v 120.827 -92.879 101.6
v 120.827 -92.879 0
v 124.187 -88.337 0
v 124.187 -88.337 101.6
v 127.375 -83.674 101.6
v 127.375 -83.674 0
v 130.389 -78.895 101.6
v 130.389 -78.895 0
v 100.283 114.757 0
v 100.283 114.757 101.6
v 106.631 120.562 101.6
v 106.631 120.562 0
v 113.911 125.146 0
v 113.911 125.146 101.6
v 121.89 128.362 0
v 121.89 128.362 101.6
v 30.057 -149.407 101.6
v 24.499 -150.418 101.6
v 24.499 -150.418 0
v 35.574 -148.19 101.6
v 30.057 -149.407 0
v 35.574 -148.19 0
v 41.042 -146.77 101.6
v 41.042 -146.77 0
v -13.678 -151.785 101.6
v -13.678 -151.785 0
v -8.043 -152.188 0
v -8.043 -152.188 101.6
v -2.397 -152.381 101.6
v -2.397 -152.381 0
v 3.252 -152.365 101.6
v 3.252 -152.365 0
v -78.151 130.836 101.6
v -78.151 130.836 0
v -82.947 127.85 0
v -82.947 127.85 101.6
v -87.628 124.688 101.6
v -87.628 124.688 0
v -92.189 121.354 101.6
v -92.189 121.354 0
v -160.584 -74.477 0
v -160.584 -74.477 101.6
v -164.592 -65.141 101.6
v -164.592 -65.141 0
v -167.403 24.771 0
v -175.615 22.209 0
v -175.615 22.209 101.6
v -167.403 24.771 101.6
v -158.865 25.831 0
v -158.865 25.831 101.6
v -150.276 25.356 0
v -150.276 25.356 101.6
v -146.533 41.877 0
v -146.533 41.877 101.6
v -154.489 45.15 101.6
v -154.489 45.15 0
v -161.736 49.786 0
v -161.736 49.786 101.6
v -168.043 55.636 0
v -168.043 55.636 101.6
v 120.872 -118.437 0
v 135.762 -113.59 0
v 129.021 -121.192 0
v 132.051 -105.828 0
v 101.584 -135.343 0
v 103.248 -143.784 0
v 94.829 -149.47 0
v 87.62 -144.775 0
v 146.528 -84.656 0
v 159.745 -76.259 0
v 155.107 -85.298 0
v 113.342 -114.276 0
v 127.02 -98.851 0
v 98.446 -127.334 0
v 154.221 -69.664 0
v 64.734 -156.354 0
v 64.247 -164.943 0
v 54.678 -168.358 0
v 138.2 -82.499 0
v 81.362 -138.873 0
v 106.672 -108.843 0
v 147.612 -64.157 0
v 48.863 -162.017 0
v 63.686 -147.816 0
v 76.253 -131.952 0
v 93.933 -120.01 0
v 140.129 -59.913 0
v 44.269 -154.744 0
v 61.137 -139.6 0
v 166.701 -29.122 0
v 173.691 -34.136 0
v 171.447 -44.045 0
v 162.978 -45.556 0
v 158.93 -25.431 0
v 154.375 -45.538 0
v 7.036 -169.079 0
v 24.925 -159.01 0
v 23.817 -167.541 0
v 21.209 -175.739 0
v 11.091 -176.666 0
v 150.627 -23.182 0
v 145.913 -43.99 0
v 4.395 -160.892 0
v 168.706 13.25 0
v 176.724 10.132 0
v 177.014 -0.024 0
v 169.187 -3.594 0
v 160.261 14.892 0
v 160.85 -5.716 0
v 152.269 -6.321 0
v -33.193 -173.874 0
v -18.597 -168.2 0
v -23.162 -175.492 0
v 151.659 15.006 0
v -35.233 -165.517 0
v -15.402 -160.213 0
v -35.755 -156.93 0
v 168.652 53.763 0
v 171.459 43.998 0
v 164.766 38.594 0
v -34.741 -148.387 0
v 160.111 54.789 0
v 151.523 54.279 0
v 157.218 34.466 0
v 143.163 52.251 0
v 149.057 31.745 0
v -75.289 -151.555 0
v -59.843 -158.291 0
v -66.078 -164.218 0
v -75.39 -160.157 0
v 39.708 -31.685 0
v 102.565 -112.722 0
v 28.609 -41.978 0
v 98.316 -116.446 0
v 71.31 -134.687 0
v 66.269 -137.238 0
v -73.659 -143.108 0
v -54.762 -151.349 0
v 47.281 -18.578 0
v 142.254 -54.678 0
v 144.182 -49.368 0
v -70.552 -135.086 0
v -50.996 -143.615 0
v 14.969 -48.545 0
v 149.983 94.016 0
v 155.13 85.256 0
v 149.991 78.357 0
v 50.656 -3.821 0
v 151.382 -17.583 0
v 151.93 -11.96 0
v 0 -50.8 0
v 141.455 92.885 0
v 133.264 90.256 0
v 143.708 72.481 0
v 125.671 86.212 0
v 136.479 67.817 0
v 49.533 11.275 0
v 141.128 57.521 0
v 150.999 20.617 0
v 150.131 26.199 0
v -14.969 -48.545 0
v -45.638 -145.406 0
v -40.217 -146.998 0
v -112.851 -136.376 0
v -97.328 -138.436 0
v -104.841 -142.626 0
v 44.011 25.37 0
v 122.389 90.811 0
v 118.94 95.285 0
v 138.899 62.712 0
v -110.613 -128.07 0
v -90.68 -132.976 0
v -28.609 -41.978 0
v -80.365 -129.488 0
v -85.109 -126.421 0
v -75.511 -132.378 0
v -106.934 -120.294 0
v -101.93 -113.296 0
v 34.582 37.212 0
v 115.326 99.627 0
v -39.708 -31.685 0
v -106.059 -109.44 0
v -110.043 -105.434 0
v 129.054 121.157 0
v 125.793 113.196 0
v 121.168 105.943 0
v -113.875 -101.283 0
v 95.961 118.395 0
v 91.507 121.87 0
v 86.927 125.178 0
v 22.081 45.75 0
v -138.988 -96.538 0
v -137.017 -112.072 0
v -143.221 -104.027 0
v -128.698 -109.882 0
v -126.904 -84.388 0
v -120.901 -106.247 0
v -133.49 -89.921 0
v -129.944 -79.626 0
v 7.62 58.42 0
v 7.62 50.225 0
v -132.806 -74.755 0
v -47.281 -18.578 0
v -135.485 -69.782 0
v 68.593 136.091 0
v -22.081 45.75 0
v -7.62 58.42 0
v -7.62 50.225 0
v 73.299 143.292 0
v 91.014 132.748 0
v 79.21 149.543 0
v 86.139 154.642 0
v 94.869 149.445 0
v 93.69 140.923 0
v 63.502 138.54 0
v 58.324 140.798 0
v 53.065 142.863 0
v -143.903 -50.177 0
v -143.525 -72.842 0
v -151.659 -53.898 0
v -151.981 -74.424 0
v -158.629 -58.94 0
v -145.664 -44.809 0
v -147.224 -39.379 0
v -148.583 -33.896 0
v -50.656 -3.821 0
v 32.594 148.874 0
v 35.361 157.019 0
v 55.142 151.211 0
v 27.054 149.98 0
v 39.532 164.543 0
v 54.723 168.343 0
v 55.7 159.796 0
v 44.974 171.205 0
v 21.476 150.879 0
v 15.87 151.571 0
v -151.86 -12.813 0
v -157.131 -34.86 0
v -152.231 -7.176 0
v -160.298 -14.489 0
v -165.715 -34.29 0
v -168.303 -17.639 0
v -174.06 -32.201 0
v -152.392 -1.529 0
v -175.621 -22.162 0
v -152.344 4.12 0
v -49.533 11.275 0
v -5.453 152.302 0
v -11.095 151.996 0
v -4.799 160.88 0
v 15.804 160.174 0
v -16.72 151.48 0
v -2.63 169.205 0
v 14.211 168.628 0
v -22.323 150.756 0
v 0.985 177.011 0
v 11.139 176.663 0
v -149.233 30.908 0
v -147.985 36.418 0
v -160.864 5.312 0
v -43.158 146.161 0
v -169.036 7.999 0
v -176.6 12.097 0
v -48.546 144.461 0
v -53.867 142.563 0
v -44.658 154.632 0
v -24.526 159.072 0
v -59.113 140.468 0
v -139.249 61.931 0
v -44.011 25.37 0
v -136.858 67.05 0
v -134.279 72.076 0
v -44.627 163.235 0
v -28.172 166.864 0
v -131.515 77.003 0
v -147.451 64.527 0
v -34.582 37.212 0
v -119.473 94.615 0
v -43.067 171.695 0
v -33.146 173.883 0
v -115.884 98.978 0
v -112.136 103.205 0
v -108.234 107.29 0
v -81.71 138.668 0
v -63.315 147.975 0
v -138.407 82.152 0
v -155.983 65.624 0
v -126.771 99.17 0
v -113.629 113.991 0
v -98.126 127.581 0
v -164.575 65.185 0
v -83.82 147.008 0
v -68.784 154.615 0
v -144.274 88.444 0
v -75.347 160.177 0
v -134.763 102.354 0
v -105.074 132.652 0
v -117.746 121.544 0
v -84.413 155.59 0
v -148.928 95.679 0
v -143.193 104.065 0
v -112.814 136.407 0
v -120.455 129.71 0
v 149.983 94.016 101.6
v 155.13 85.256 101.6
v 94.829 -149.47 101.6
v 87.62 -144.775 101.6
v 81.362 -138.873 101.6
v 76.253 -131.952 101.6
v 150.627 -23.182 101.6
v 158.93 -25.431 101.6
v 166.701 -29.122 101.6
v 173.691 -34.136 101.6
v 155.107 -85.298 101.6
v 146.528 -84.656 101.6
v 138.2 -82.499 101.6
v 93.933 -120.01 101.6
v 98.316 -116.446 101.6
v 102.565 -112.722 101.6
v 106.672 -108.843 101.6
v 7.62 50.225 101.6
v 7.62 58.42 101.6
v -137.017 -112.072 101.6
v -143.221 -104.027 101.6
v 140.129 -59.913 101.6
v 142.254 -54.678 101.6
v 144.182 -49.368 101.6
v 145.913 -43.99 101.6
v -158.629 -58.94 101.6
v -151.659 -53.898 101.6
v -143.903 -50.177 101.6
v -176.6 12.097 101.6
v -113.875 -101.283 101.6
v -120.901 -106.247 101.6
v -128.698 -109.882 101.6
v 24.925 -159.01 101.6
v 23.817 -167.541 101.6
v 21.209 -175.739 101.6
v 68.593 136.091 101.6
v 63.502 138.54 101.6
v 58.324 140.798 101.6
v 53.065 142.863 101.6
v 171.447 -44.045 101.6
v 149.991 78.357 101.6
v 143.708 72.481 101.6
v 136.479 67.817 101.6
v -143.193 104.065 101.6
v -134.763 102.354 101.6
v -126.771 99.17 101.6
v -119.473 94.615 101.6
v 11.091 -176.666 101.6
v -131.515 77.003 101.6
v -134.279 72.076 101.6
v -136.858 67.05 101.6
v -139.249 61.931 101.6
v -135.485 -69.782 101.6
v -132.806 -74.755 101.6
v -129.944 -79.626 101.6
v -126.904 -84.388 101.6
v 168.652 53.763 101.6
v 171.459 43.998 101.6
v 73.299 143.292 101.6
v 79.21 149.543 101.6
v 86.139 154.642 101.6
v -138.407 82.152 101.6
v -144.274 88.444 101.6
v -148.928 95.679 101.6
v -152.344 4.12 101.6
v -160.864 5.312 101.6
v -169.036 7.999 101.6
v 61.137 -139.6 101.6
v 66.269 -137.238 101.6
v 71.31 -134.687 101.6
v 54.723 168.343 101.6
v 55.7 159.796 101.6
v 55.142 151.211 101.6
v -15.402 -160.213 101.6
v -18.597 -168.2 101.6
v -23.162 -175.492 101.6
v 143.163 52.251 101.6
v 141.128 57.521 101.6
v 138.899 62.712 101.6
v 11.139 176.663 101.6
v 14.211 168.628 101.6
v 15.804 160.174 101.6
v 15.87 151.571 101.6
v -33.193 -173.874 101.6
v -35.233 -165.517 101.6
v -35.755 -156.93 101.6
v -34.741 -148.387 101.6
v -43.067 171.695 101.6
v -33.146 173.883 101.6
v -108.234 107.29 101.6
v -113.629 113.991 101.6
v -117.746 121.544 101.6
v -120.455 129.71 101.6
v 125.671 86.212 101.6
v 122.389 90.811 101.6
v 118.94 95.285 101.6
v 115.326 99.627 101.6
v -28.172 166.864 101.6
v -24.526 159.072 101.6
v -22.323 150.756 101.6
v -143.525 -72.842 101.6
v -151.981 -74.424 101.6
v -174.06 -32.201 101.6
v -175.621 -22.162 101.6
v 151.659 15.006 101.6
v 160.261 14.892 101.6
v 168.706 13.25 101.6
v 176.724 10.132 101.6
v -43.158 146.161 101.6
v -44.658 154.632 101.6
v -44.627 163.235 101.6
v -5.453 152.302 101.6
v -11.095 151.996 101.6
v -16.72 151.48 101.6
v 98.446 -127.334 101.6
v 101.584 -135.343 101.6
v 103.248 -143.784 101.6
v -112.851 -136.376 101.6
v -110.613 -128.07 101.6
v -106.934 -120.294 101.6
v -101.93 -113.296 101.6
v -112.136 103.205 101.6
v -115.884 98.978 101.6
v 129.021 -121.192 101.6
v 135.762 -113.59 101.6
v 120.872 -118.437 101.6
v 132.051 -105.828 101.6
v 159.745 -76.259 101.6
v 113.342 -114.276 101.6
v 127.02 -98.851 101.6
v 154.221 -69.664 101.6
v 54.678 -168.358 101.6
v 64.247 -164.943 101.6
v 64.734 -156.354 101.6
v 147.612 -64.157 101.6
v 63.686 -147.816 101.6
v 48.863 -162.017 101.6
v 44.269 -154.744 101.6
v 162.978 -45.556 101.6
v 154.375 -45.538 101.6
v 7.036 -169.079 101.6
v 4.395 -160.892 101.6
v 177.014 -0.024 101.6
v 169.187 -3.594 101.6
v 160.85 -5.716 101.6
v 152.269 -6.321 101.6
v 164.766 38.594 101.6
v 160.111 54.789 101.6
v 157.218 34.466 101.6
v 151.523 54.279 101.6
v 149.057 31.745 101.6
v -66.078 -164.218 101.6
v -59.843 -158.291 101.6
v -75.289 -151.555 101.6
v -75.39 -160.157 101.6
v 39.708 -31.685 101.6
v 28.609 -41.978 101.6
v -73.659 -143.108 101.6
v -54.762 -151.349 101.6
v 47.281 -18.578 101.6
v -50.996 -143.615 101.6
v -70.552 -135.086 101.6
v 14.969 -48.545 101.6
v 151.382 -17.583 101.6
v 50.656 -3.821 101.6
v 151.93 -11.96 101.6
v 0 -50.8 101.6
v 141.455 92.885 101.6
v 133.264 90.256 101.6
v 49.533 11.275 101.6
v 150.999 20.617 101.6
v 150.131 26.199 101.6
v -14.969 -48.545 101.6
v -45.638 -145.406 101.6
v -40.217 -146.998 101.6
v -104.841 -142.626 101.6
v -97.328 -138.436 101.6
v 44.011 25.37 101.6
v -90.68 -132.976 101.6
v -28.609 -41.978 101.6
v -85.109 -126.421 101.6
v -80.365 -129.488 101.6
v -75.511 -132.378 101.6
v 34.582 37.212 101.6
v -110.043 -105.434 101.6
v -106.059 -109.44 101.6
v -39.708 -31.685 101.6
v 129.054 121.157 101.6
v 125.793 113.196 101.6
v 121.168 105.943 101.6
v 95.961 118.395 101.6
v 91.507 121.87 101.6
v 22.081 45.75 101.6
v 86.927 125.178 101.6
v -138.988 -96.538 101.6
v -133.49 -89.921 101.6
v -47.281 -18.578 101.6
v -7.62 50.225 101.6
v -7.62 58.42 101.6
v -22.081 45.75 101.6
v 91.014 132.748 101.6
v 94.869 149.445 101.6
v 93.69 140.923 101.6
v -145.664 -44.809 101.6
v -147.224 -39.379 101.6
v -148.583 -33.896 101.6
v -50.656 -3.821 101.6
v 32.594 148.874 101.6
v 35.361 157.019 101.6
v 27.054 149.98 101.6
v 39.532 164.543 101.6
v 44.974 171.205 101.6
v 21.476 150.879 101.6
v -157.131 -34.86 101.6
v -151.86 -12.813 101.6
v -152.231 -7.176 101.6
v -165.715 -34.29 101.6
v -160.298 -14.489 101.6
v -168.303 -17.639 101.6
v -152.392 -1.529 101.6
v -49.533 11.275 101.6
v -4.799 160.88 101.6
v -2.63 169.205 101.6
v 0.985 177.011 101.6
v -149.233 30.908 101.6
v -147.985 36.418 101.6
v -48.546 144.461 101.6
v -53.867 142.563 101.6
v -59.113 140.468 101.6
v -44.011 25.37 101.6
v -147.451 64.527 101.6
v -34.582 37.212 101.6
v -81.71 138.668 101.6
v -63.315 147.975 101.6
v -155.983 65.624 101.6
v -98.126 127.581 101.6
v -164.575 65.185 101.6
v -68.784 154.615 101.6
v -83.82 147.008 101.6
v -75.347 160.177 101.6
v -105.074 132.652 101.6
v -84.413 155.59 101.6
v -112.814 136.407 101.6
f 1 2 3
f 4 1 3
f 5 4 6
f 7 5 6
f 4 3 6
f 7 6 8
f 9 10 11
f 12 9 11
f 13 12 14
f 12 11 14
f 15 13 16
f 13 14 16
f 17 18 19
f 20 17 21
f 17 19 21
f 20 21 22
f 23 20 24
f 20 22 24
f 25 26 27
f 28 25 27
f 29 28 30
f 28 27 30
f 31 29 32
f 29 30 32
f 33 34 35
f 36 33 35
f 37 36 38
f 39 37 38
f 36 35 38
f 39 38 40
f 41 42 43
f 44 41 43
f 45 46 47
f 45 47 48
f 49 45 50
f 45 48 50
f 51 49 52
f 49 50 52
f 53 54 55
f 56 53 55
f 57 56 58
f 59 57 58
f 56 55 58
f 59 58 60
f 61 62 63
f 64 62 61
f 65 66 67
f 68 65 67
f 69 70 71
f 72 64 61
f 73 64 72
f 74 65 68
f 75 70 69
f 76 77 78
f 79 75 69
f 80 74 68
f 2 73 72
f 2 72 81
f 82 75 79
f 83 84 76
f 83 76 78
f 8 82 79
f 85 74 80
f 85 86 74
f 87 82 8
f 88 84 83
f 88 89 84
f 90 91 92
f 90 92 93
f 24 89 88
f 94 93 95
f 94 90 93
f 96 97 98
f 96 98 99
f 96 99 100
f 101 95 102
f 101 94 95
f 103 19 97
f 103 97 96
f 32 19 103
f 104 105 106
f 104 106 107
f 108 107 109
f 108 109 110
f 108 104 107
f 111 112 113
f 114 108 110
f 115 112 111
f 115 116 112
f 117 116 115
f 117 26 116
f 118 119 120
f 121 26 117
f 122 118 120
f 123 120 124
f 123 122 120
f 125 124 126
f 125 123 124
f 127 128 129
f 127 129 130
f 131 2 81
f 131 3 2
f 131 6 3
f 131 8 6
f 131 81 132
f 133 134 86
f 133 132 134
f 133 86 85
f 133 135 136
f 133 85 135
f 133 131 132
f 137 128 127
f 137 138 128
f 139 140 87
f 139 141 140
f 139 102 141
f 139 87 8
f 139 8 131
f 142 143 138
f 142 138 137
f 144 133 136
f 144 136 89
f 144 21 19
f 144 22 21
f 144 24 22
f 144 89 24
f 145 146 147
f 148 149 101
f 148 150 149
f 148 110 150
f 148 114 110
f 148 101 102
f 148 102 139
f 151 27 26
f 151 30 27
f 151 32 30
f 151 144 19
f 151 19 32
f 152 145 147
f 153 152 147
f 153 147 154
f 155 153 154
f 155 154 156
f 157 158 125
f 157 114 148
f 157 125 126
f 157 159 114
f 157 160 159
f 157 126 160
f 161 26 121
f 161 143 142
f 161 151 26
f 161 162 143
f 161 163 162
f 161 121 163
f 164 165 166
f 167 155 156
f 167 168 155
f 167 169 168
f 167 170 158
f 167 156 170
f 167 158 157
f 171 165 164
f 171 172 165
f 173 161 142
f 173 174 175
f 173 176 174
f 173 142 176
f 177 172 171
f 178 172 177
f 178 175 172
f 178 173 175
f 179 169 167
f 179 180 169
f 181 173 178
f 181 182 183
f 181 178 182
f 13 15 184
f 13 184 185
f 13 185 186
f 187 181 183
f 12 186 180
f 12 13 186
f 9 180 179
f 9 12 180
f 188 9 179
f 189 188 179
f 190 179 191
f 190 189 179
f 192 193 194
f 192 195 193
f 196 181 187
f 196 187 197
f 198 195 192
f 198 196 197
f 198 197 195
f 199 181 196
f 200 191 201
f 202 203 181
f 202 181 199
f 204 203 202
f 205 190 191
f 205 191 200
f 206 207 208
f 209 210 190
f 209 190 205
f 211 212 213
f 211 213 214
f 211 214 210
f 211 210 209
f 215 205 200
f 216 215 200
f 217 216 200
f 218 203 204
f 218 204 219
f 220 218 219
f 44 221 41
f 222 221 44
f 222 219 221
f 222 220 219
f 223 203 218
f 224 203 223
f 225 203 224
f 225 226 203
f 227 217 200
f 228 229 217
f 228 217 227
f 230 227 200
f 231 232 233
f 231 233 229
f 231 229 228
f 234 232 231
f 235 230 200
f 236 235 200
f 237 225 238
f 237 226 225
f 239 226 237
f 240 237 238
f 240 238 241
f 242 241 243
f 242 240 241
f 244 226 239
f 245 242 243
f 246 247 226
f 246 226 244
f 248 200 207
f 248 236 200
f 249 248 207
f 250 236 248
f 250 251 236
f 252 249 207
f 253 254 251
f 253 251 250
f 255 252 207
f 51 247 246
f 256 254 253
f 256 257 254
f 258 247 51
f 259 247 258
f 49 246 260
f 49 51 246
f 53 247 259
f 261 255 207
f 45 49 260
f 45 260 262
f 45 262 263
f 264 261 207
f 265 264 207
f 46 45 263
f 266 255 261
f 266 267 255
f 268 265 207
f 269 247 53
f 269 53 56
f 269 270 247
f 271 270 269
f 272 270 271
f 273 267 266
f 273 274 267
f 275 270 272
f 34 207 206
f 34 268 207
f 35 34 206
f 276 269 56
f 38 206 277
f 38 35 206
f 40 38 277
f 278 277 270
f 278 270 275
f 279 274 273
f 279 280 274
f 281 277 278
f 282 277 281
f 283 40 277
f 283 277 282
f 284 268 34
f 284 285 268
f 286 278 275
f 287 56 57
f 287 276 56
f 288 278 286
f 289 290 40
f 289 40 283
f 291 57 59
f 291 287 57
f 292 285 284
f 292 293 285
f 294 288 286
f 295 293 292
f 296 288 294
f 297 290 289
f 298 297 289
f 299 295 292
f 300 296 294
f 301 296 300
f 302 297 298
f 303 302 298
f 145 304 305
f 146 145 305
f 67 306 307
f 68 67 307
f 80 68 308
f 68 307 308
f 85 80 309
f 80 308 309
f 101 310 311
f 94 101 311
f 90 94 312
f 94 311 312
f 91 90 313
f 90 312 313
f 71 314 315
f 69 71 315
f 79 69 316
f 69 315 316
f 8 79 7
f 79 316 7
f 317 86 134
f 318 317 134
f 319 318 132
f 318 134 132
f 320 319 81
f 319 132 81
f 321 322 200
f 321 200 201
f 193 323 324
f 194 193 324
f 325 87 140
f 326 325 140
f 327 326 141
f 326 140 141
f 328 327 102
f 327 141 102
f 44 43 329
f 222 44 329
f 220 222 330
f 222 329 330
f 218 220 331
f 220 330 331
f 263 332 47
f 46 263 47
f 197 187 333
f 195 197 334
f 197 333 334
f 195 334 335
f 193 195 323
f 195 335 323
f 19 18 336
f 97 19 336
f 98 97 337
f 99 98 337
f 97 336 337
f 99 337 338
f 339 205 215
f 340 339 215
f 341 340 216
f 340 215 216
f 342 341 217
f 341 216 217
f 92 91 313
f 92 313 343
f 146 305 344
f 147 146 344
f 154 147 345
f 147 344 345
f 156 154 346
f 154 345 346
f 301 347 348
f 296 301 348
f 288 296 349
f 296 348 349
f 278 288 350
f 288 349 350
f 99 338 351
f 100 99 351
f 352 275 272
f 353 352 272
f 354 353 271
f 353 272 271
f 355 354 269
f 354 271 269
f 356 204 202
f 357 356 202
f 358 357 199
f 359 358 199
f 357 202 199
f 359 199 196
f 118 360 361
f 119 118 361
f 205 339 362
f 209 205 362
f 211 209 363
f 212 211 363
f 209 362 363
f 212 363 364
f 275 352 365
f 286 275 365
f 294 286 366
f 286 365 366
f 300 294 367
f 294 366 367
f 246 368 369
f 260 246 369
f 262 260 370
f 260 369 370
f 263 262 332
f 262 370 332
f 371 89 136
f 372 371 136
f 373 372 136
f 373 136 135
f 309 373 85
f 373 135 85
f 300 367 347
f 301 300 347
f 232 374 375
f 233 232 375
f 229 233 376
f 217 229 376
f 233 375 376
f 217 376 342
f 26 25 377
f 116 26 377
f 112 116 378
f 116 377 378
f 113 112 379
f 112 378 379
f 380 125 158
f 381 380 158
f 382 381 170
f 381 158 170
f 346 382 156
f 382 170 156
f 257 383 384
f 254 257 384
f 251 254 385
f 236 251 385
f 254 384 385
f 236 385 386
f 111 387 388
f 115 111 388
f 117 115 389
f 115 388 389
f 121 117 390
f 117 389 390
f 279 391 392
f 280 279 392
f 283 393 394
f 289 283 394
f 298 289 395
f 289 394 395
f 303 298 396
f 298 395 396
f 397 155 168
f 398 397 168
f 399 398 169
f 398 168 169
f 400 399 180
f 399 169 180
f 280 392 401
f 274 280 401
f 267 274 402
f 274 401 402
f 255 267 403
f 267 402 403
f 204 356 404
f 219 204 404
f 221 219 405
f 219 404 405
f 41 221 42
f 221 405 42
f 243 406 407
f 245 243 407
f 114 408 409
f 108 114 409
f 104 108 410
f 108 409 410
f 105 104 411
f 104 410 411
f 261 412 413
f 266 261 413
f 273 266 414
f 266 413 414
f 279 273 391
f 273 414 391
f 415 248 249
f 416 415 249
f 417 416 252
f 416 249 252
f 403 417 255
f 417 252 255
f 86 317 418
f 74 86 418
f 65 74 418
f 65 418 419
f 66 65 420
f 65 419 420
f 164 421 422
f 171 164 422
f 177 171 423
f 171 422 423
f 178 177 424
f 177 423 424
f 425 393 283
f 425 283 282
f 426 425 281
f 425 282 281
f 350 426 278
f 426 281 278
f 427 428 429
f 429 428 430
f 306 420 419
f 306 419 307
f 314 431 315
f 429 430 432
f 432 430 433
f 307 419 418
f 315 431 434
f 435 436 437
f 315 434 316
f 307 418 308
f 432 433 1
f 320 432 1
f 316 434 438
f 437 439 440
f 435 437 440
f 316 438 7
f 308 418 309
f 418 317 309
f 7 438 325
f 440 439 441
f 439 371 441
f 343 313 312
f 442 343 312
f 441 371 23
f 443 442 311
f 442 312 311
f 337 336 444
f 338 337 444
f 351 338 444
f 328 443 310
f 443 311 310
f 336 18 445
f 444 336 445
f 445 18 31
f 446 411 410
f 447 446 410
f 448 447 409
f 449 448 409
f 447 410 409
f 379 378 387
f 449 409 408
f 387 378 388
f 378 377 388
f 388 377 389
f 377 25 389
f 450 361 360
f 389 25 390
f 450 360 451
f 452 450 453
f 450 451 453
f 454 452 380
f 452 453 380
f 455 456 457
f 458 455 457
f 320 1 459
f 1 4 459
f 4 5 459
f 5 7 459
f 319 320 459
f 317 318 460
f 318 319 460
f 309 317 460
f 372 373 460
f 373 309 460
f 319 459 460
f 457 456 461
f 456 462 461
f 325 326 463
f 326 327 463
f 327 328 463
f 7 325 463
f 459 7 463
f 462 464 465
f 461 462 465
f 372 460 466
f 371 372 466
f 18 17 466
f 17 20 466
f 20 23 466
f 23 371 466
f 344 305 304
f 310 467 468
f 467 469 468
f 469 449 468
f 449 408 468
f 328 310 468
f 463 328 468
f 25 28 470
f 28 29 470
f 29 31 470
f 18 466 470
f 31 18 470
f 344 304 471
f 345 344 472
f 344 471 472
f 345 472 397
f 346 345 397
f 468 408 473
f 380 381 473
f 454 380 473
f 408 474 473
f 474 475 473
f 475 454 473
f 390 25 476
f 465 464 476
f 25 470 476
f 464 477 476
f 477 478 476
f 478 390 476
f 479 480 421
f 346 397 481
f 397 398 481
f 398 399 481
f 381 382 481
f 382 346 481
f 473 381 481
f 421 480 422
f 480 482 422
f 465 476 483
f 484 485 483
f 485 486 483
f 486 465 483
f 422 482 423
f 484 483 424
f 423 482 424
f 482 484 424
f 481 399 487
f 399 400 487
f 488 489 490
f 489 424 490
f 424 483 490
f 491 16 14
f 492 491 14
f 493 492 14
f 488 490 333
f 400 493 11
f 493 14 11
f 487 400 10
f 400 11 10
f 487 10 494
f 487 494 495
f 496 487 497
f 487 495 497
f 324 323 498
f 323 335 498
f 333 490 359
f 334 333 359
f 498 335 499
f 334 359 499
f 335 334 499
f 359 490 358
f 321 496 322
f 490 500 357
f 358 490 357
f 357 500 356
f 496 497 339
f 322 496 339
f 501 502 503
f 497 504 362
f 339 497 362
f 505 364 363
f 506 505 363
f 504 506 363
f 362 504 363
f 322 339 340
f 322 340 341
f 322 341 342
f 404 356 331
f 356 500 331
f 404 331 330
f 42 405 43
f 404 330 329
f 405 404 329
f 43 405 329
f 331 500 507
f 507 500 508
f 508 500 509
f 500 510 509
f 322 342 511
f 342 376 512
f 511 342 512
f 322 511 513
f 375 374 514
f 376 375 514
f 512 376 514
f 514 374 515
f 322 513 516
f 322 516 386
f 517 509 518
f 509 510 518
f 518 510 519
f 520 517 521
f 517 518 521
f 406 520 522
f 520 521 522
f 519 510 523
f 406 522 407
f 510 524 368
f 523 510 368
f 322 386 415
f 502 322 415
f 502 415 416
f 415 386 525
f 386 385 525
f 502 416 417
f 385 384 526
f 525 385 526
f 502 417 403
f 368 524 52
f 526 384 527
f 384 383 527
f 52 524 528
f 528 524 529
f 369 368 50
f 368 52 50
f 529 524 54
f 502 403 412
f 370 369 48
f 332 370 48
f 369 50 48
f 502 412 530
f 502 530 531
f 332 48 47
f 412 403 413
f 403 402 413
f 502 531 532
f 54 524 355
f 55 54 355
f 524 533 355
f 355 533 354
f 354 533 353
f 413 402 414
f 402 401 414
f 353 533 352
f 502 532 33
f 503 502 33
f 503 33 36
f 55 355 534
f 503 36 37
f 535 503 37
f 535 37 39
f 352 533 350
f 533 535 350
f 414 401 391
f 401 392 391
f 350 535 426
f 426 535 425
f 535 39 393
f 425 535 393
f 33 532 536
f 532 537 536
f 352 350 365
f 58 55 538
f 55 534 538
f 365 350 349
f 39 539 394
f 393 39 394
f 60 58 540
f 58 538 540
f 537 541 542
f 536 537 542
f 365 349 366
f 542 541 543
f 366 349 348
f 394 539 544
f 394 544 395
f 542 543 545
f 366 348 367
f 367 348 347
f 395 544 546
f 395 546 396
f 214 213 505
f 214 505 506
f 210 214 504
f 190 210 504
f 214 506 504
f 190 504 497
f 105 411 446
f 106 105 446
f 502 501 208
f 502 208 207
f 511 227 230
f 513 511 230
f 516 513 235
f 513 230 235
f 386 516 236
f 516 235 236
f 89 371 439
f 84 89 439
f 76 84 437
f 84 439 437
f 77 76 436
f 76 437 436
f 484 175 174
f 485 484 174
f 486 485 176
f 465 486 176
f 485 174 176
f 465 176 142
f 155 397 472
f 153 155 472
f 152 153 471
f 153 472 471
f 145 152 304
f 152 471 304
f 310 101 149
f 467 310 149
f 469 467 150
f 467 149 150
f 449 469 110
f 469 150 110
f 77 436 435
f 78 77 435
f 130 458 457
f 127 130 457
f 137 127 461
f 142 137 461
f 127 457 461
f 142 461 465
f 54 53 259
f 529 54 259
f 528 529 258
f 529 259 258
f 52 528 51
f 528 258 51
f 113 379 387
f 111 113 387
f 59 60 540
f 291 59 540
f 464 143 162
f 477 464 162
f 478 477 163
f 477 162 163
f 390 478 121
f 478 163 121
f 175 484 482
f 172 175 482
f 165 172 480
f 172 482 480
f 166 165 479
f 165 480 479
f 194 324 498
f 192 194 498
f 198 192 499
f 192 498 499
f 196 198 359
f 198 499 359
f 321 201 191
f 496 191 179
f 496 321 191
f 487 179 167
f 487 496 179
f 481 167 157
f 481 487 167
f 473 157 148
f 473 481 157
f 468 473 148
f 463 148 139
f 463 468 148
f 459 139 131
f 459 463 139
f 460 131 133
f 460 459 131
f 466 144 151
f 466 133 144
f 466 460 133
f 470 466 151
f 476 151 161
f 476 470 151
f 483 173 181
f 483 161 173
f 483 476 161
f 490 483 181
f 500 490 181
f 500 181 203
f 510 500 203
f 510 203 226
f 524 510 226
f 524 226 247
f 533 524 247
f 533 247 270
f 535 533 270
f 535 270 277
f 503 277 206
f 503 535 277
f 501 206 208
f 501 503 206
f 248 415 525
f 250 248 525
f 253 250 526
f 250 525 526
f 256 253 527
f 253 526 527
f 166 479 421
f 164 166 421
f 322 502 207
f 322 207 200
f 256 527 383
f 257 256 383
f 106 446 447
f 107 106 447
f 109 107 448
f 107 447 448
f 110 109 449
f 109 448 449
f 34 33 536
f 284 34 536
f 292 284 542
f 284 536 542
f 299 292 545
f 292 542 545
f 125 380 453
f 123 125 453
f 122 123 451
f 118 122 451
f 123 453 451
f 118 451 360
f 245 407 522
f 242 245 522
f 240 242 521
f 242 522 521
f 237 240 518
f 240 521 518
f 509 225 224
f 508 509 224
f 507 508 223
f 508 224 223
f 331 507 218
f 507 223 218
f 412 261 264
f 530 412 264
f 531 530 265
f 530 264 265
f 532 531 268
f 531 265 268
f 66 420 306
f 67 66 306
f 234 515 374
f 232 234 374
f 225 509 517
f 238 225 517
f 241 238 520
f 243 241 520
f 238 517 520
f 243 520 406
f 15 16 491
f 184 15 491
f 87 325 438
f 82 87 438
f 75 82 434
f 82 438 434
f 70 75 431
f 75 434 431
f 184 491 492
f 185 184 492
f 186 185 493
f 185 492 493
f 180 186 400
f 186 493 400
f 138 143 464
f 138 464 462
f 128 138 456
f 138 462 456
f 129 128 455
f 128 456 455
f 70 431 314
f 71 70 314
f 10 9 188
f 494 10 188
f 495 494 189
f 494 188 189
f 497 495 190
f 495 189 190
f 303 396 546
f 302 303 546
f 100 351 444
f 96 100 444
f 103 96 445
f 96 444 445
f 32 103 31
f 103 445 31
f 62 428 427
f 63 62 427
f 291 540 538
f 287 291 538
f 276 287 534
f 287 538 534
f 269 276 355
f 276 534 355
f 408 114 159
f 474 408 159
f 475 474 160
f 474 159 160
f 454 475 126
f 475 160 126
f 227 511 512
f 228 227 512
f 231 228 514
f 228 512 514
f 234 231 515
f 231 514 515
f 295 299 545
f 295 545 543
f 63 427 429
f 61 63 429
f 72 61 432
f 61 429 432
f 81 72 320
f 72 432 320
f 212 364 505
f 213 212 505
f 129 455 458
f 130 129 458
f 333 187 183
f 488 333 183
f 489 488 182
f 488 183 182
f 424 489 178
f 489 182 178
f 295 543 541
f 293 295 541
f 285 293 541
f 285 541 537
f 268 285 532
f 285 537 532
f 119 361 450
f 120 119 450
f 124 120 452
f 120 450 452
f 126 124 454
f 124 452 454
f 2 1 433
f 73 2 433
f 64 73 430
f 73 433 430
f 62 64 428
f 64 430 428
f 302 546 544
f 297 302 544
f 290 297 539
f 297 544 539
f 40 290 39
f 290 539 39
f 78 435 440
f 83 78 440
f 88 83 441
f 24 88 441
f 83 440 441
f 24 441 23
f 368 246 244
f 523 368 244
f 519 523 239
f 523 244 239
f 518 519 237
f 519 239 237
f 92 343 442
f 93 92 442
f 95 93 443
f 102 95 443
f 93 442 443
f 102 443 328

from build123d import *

# Parameters (mm, degrees)
SKETCH1_R           = 152.4
BOSS_EXTRUDE1_DEPTH = 101.6
CUT_EXTRUDE1_DEPTH  = 102.6
BOSS_EXTRUDE3_DEPTH = 101.6


with BuildPart() as part:
    # Sketch1 → Boss-Extrude1 (new body)
    with BuildSketch(Plane.XY):
        Circle(SKETCH1_R)
    extrude(amount=BOSS_EXTRUDE1_DEPTH)

    # Sketch2 → Cut-Extrude1 (cut, through all)
    with BuildSketch(Plane.XY.offset(101.6)):
        with BuildLine():
            Line((-7.62, 50.225248631), (-7.62, 58.42))
            Line((-7.62, 58.42), (7.62, 58.42))
            Line((7.62, 58.42), (7.62, 50.225248631))
            ThreePointArc((7.62, 50.225248631), (0, -50.8), (-7.62, 50.225248631))
        make_face()
    extrude(amount=-CUT_EXTRUDE1_DEPTH, mode=Mode.SUBTRACT)

    # Sketch3 → Boss-Extrude3 (add)
    with BuildSketch(Plane.XY.offset(101.6)):
        with BuildLine():
            Line((0.984560076, 177.011085759), (11.138596509, 176.66302813))
            ThreePointArc((11.138596509, 176.66302813), (15.196562883, 164.436371227), (15.869603853, 151.571487007))
            ThreePointArc((15.869603853, 151.571487007), (5.22086444, 152.310546498), (-5.453487698, 152.302394833))
            ThreePointArc((-5.453487698, 152.302394833), (-3.901102684, 165.090996434), (0.984560076, 177.011085759))
        make_face()
        with BuildLine():
            Line((44.974495255, 171.205106866), (54.722965549, 168.342777932))
            ThreePointArc((54.722965549, 168.342777932), (55.612797522, 155.491068739), (53.065327067, 142.862980031))
            ThreePointArc((53.065327067, 142.862980031), (42.934934006, 146.227054412), (32.593909032, 148.873762275))
            ThreePointArc((32.593909032, 148.873762275), (37.277918906, 160.874523986), (44.974495255, 171.205106866))
        make_face()
        with BuildLine():
            Line((86.138517492, 154.641681459), (94.868889406, 149.444931875))
            ThreePointArc((94.868889406, 149.444931875), (92.534675563, 136.775690545), (86.926760621, 125.177866606))
            ThreePointArc((86.926760621, 125.177866606), (77.951243764, 130.955578711), (68.593310586, 136.090843714))
            ThreePointArc((68.593310586, 136.090843714), (76.114631752, 146.549713541), (86.138517492, 154.641681459))
        make_face()
        with BuildLine():
            Line((121.890139881, 128.361550474), (129.053852039, 121.156911128))
            ThreePointArc((129.053852039, 121.156911128), (123.642259619, 109.46619269), (115.326266111, 99.62736745))
            ThreePointArc((115.326266111, 99.62736745), (108.069590193, 107.455682379), (100.282742167, 114.756836935))
            ThreePointArc((100.282742167, 114.756836935), (110.168782355, 123.016645622), (121.890139881, 128.361550474))
        make_face()
        with BuildLine():
            Line((149.9829565, 94.015991192), (155.129886522, 85.256156071))
            ThreePointArc((155.129886522, 85.256156071), (146.980945779, 75.278531359), (136.47939816, 67.816914393))
            ThreePointArc((136.47939816, 67.816914393), (131.397526817, 77.203950329), (125.671040244, 86.212236046))
            ThreePointArc((125.671040244, 86.212236046), (137.30062319, 91.753989435), (149.9829565, 94.015991192))
        make_face()
        with BuildLine():
            Line((168.651792363, 53.763061417), (171.458539706, 43.998443178))
            ThreePointArc((171.458539706, 43.998443178), (161.084278558, 36.360843047), (149.057027687, 31.745275192))
            ThreePointArc((149.057027687, 31.745275192), (146.469273585, 42.101210144), (143.162964676, 52.250603299))
            ThreePointArc((143.162964676, 52.250603299), (155.805360914, 54.726092645), (168.651792363, 53.763061417))
        make_face()
        with BuildLine():
            Line((176.723615855, 10.132000766), (177.01382226, -0.023853715))
            ThreePointArc((177.01382226, -0.023853715), (165.066093688, -4.841530759), (152.268855971, -6.3210364))
            ThreePointArc((152.268855971, -6.3210364), (152.337817217, 4.353096088), (151.659433521, 15.005872983))
            ThreePointArc((151.659433521, 15.005872983), (164.520274799, 14.259554184), (176.723615855, 10.132000766))
        make_face()
        with BuildLine():
            Line((173.691244618, -34.135690756), (171.446675351, -44.044651791))
            ThreePointArc((171.446675351, -44.044651791), (158.676199082, -45.739693381), (145.913072029, -43.990174028))
            ThreePointArc((145.913072029, -43.990174028), (148.634415534, -33.668539005), (150.626582394, -23.181731521))
            ThreePointArc((150.626582394, -23.181731521), (162.897774756, -27.102964508), (173.691244618, -34.135690756))
        make_face()
        with BuildLine():
            Line((159.74521369, -76.258511285), (155.106903292, -85.297962411))
            ThreePointArc((155.106903292, -85.297962411), (142.316095317, -83.76386285), (130.389033141, -78.895247238))
            ThreePointArc((130.389033141, -78.895247238), (135.591766884, -69.574655969), (140.129309129, -59.912742576))
            ThreePointArc((140.129309129, -59.912742576), (151.039808429, -66.762504263), (159.74521369, -76.258511285))
        make_face()
        with BuildLine():
            Line((135.761803484, -113.589729091), (129.021194056, -121.191688348))
            ThreePointArc((129.021194056, -121.191688348), (117.013747881, -116.524840753), (106.672171762, -108.843041907))
            ThreePointArc((106.672171762, -108.843041907), (114.02938885, -101.109141419), (120.827196012, -92.879215672))
            ThreePointArc((120.827196012, -92.879215672), (129.691455452, -102.227110339), (135.761803484, -113.589729091))
        make_face()
        with BuildLine():
            Line((103.247979869, -143.783686465), (94.828608691, -149.470494794))
            ThreePointArc((94.828608691, -149.470494794), (84.358996319, -141.964134364), (76.25270552, -131.951827956))
            ThreePointArc((76.25270552, -131.951827956), (85.302124943, -126.290567662), (93.933065798, -120.009746062))
            ThreePointArc((93.933065798, -120.009746062), (100.194111358, -131.268411108), (103.247979869, -143.783686465))
        make_face()
        with BuildLine():
            Line((64.246705958, -164.943186018), (54.677593087, -168.357520338))
            ThreePointArc((54.677593087, -168.357520338), (46.403658768, -158.483299305), (41.042001351, -146.76959537))
            ThreePointArc((41.042001351, -146.76959537), (51.215014806, -143.536693073), (61.136775598, -139.599622741))
            ThreePointArc((61.136775598, -139.599622741), (64.401202759, -152.061634836), (64.246705958, -164.943186018))
        make_face()
        with BuildLine():
            Line((21.20857523, -175.738698575), (11.090983218, -176.666023704))
            ThreePointArc((11.090983218, -176.666023704), (5.532608676, -165.04437569), (3.252477296, -152.365289326))
            ThreePointArc((3.252477296, -152.365289326), (13.909876934, -151.763880168), (24.499036942, -150.417941712))
            ThreePointArc((24.499036942, -150.417941712), (24.561729739, -163.300266803), (21.20857523, -175.738698575))
        make_face()
        with BuildLine():
            Line((-23.16216828, -175.49190238), (-33.192513915, -173.873951069))
            ThreePointArc((-33.192513915, -173.873951069), (-35.686075567, -161.23510696), (-34.74141187, -148.387311794))
            ThreePointArc((-34.74141187, -148.387311794), (-24.269269663, -150.455184524), (-13.678066306, -151.784948207))
            ThreePointArc((-13.678066306, -151.784948207), (-16.821047091, -164.27814243), (-23.16216828, -175.49190238))
        make_face()
        with BuildLine():
            Line((-66.077547573, -164.218304543), (-75.390403326, -160.156738624))
            ThreePointArc((-75.390403326, -160.156738624), (-74.662472438, -147.294843478), (-70.552370357, -135.085613731))
            ThreePointArc((-70.552370357, -135.085613731), (-60.923488791, -139.6928363), (-50.995726343, -143.61474818))
            ThreePointArc((-50.995726343, -143.61474818), (-57.14689567, -154.933818196), (-66.077547573, -164.218304543))
        make_face()
        with BuildLine():
            Line((-104.841031535, -142.62626668), (-112.851236429, -136.376289276))
            ThreePointArc((-112.851236429, -136.376289276), (-108.947551576, -124.099503267), (-101.930263942, -113.295989747))
            ThreePointArc((-101.930263942, -113.295989747), (-93.749661058, -120.153073417), (-85.109137346, -126.420705346))
            ThreePointArc((-85.109137346, -126.420705346), (-93.881994622, -135.854432358), (-104.841031535, -142.62626668))
        make_face()
        with BuildLine():
            Line((-137.016967907, -112.072495938), (-143.22121131, -104.026816116))
            ThreePointArc((-143.22121131, -104.026816116), (-136.387055368, -93.106534861), (-126.90350417, -84.387562054))
            ThreePointArc((-126.90350417, -84.387562054), (-120.685197332, -93.06365104), (-113.874828239, -101.283184653))
            ThreePointArc((-113.874828239, -101.283184653), (-124.718142578, -108.238812898), (-137.016967907, -112.072495938))
        make_face()
        with BuildLine():
            Line((-160.583624273, -74.476798103), (-164.592070753, -65.140955515))
            ThreePointArc((-164.592070753, -65.140955515), (-155.256858874, -56.263340447), (-143.902930513, -50.176753481))
            ThreePointArc((-143.902930513, -50.176753481), (-140.03763881, -60.126697203), (-135.485344872, -69.781668975))
            ThreePointArc((-135.485344872, -69.781668975), (-147.717790955, -73.822150748), (-160.583624273, -74.476798103))
        make_face()
        with BuildLine():
            Line((-174.06022094, -32.201449136), (-175.621005064, -22.162049108))
            ThreePointArc((-175.621005064, -22.162049108), (-164.371302942, -15.884913431), (-151.860406493, -12.81315495))
            ThreePointArc((-151.860406493, -12.81315495), (-150.591000419, -23.411761851), (-148.582819006, -33.895514396))
            ThreePointArc((-148.582819006, -33.895514396), (-161.435787258, -34.766971368), (-174.06022094, -32.201449136))
        make_face()
        with BuildLine():
            Line((-176.599973777, 12.097235308), (-175.615025737, 22.209380351))
            ThreePointArc((-175.615025737, 22.209380351), (-163.157693531, 25.491621116), (-150.27593463, 25.35554123))
            ThreePointArc((-150.27593463, 25.35554123), (-151.682175636, 14.774220601), (-152.344288173, 4.120420012))
            ThreePointArc((-152.344288173, 4.120420012), (-165.010179328, 6.472744687), (-176.599973777, 12.097235308))
        make_face()
        with BuildLine():
            Line((-168.043300773, 55.635805968), (-164.574508477, 65.185312762))
            ThreePointArc((-164.574508477, 65.185312762), (-151.692286184, 65.266423358), (-139.249073118, 61.931055503))
            ThreePointArc((-139.249073118, 61.931055503), (-143.24260191, 52.031884437), (-146.533405431, 41.877453276))
            ThreePointArc((-146.533405431, 41.877453276), (-158.216374966, 47.305754388), (-168.043300773, 55.635805968))
        make_face()
        with BuildLine():
            Line((-148.92784916, 95.678574324), (-143.193169586, 104.065412237))
            ThreePointArc((-143.193169586, 104.065412237), (-130.695494611, 100.940296186), (-119.47268022, 94.615213793))
            ThreePointArc((-119.47268022, 94.615213793), (-125.802568697, 86.020193614), (-131.515289913, 77.003172136))
            ThreePointArc((-131.515289913, 77.003172136), (-141.481253886, 85.166369563), (-148.92784916, 95.678574324))
        make_face()
        with BuildLine():
            Line((-120.454713067, 129.709505975), (-112.814477223, 136.406699136))
            ThreePointArc((-112.814477223, 136.406699136), (-101.486624446, 130.271718973), (-92.189379433, 121.35435023))
            ThreePointArc((-92.189379433, 121.35435023), (-100.457897423, 114.603537665), (-108.233585051, 107.290498494))
            ThreePointArc((-108.233585051, 107.290498494), (-115.856345292, 117.675668518), (-120.454713067, 129.709505975))
        make_face()
        with BuildLine():
            Line((-84.41296435, 155.590312327), (-75.347236353, 160.17705146))
            ThreePointArc((-75.347236353, 160.17705146), (-65.900976426, 151.417690551), (-59.113480889, 140.468346531))
            ThreePointArc((-59.113480889, 140.468346531), (-68.801086995, 135.985919963), (-78.151165985, 130.836368244))
            ThreePointArc((-78.151165985, 130.836368244), (-82.951756434, 142.790972439), (-84.41296435, 155.590312327))
        make_face()
        with BuildLine():
            Line((-43.067238634, 171.694807134), (-33.145651515, 173.88289055))
            ThreePointArc((-33.145651515, 173.88289055), (-26.174527691, 163.049531756), (-22.323264935, 150.756200014))
            ThreePointArc((-22.323264935, 150.756200014), (-32.821251239, 148.823806789), (-43.15822174, 146.161307795))
            ThreePointArc((-43.15822174, 146.161307795), (-44.835003644, 158.934194413), (-43.067238634, 171.694807134))
        make_face()
    extrude(amount=-BOSS_EXTRUDE3_DEPTH)


solid = part.part
